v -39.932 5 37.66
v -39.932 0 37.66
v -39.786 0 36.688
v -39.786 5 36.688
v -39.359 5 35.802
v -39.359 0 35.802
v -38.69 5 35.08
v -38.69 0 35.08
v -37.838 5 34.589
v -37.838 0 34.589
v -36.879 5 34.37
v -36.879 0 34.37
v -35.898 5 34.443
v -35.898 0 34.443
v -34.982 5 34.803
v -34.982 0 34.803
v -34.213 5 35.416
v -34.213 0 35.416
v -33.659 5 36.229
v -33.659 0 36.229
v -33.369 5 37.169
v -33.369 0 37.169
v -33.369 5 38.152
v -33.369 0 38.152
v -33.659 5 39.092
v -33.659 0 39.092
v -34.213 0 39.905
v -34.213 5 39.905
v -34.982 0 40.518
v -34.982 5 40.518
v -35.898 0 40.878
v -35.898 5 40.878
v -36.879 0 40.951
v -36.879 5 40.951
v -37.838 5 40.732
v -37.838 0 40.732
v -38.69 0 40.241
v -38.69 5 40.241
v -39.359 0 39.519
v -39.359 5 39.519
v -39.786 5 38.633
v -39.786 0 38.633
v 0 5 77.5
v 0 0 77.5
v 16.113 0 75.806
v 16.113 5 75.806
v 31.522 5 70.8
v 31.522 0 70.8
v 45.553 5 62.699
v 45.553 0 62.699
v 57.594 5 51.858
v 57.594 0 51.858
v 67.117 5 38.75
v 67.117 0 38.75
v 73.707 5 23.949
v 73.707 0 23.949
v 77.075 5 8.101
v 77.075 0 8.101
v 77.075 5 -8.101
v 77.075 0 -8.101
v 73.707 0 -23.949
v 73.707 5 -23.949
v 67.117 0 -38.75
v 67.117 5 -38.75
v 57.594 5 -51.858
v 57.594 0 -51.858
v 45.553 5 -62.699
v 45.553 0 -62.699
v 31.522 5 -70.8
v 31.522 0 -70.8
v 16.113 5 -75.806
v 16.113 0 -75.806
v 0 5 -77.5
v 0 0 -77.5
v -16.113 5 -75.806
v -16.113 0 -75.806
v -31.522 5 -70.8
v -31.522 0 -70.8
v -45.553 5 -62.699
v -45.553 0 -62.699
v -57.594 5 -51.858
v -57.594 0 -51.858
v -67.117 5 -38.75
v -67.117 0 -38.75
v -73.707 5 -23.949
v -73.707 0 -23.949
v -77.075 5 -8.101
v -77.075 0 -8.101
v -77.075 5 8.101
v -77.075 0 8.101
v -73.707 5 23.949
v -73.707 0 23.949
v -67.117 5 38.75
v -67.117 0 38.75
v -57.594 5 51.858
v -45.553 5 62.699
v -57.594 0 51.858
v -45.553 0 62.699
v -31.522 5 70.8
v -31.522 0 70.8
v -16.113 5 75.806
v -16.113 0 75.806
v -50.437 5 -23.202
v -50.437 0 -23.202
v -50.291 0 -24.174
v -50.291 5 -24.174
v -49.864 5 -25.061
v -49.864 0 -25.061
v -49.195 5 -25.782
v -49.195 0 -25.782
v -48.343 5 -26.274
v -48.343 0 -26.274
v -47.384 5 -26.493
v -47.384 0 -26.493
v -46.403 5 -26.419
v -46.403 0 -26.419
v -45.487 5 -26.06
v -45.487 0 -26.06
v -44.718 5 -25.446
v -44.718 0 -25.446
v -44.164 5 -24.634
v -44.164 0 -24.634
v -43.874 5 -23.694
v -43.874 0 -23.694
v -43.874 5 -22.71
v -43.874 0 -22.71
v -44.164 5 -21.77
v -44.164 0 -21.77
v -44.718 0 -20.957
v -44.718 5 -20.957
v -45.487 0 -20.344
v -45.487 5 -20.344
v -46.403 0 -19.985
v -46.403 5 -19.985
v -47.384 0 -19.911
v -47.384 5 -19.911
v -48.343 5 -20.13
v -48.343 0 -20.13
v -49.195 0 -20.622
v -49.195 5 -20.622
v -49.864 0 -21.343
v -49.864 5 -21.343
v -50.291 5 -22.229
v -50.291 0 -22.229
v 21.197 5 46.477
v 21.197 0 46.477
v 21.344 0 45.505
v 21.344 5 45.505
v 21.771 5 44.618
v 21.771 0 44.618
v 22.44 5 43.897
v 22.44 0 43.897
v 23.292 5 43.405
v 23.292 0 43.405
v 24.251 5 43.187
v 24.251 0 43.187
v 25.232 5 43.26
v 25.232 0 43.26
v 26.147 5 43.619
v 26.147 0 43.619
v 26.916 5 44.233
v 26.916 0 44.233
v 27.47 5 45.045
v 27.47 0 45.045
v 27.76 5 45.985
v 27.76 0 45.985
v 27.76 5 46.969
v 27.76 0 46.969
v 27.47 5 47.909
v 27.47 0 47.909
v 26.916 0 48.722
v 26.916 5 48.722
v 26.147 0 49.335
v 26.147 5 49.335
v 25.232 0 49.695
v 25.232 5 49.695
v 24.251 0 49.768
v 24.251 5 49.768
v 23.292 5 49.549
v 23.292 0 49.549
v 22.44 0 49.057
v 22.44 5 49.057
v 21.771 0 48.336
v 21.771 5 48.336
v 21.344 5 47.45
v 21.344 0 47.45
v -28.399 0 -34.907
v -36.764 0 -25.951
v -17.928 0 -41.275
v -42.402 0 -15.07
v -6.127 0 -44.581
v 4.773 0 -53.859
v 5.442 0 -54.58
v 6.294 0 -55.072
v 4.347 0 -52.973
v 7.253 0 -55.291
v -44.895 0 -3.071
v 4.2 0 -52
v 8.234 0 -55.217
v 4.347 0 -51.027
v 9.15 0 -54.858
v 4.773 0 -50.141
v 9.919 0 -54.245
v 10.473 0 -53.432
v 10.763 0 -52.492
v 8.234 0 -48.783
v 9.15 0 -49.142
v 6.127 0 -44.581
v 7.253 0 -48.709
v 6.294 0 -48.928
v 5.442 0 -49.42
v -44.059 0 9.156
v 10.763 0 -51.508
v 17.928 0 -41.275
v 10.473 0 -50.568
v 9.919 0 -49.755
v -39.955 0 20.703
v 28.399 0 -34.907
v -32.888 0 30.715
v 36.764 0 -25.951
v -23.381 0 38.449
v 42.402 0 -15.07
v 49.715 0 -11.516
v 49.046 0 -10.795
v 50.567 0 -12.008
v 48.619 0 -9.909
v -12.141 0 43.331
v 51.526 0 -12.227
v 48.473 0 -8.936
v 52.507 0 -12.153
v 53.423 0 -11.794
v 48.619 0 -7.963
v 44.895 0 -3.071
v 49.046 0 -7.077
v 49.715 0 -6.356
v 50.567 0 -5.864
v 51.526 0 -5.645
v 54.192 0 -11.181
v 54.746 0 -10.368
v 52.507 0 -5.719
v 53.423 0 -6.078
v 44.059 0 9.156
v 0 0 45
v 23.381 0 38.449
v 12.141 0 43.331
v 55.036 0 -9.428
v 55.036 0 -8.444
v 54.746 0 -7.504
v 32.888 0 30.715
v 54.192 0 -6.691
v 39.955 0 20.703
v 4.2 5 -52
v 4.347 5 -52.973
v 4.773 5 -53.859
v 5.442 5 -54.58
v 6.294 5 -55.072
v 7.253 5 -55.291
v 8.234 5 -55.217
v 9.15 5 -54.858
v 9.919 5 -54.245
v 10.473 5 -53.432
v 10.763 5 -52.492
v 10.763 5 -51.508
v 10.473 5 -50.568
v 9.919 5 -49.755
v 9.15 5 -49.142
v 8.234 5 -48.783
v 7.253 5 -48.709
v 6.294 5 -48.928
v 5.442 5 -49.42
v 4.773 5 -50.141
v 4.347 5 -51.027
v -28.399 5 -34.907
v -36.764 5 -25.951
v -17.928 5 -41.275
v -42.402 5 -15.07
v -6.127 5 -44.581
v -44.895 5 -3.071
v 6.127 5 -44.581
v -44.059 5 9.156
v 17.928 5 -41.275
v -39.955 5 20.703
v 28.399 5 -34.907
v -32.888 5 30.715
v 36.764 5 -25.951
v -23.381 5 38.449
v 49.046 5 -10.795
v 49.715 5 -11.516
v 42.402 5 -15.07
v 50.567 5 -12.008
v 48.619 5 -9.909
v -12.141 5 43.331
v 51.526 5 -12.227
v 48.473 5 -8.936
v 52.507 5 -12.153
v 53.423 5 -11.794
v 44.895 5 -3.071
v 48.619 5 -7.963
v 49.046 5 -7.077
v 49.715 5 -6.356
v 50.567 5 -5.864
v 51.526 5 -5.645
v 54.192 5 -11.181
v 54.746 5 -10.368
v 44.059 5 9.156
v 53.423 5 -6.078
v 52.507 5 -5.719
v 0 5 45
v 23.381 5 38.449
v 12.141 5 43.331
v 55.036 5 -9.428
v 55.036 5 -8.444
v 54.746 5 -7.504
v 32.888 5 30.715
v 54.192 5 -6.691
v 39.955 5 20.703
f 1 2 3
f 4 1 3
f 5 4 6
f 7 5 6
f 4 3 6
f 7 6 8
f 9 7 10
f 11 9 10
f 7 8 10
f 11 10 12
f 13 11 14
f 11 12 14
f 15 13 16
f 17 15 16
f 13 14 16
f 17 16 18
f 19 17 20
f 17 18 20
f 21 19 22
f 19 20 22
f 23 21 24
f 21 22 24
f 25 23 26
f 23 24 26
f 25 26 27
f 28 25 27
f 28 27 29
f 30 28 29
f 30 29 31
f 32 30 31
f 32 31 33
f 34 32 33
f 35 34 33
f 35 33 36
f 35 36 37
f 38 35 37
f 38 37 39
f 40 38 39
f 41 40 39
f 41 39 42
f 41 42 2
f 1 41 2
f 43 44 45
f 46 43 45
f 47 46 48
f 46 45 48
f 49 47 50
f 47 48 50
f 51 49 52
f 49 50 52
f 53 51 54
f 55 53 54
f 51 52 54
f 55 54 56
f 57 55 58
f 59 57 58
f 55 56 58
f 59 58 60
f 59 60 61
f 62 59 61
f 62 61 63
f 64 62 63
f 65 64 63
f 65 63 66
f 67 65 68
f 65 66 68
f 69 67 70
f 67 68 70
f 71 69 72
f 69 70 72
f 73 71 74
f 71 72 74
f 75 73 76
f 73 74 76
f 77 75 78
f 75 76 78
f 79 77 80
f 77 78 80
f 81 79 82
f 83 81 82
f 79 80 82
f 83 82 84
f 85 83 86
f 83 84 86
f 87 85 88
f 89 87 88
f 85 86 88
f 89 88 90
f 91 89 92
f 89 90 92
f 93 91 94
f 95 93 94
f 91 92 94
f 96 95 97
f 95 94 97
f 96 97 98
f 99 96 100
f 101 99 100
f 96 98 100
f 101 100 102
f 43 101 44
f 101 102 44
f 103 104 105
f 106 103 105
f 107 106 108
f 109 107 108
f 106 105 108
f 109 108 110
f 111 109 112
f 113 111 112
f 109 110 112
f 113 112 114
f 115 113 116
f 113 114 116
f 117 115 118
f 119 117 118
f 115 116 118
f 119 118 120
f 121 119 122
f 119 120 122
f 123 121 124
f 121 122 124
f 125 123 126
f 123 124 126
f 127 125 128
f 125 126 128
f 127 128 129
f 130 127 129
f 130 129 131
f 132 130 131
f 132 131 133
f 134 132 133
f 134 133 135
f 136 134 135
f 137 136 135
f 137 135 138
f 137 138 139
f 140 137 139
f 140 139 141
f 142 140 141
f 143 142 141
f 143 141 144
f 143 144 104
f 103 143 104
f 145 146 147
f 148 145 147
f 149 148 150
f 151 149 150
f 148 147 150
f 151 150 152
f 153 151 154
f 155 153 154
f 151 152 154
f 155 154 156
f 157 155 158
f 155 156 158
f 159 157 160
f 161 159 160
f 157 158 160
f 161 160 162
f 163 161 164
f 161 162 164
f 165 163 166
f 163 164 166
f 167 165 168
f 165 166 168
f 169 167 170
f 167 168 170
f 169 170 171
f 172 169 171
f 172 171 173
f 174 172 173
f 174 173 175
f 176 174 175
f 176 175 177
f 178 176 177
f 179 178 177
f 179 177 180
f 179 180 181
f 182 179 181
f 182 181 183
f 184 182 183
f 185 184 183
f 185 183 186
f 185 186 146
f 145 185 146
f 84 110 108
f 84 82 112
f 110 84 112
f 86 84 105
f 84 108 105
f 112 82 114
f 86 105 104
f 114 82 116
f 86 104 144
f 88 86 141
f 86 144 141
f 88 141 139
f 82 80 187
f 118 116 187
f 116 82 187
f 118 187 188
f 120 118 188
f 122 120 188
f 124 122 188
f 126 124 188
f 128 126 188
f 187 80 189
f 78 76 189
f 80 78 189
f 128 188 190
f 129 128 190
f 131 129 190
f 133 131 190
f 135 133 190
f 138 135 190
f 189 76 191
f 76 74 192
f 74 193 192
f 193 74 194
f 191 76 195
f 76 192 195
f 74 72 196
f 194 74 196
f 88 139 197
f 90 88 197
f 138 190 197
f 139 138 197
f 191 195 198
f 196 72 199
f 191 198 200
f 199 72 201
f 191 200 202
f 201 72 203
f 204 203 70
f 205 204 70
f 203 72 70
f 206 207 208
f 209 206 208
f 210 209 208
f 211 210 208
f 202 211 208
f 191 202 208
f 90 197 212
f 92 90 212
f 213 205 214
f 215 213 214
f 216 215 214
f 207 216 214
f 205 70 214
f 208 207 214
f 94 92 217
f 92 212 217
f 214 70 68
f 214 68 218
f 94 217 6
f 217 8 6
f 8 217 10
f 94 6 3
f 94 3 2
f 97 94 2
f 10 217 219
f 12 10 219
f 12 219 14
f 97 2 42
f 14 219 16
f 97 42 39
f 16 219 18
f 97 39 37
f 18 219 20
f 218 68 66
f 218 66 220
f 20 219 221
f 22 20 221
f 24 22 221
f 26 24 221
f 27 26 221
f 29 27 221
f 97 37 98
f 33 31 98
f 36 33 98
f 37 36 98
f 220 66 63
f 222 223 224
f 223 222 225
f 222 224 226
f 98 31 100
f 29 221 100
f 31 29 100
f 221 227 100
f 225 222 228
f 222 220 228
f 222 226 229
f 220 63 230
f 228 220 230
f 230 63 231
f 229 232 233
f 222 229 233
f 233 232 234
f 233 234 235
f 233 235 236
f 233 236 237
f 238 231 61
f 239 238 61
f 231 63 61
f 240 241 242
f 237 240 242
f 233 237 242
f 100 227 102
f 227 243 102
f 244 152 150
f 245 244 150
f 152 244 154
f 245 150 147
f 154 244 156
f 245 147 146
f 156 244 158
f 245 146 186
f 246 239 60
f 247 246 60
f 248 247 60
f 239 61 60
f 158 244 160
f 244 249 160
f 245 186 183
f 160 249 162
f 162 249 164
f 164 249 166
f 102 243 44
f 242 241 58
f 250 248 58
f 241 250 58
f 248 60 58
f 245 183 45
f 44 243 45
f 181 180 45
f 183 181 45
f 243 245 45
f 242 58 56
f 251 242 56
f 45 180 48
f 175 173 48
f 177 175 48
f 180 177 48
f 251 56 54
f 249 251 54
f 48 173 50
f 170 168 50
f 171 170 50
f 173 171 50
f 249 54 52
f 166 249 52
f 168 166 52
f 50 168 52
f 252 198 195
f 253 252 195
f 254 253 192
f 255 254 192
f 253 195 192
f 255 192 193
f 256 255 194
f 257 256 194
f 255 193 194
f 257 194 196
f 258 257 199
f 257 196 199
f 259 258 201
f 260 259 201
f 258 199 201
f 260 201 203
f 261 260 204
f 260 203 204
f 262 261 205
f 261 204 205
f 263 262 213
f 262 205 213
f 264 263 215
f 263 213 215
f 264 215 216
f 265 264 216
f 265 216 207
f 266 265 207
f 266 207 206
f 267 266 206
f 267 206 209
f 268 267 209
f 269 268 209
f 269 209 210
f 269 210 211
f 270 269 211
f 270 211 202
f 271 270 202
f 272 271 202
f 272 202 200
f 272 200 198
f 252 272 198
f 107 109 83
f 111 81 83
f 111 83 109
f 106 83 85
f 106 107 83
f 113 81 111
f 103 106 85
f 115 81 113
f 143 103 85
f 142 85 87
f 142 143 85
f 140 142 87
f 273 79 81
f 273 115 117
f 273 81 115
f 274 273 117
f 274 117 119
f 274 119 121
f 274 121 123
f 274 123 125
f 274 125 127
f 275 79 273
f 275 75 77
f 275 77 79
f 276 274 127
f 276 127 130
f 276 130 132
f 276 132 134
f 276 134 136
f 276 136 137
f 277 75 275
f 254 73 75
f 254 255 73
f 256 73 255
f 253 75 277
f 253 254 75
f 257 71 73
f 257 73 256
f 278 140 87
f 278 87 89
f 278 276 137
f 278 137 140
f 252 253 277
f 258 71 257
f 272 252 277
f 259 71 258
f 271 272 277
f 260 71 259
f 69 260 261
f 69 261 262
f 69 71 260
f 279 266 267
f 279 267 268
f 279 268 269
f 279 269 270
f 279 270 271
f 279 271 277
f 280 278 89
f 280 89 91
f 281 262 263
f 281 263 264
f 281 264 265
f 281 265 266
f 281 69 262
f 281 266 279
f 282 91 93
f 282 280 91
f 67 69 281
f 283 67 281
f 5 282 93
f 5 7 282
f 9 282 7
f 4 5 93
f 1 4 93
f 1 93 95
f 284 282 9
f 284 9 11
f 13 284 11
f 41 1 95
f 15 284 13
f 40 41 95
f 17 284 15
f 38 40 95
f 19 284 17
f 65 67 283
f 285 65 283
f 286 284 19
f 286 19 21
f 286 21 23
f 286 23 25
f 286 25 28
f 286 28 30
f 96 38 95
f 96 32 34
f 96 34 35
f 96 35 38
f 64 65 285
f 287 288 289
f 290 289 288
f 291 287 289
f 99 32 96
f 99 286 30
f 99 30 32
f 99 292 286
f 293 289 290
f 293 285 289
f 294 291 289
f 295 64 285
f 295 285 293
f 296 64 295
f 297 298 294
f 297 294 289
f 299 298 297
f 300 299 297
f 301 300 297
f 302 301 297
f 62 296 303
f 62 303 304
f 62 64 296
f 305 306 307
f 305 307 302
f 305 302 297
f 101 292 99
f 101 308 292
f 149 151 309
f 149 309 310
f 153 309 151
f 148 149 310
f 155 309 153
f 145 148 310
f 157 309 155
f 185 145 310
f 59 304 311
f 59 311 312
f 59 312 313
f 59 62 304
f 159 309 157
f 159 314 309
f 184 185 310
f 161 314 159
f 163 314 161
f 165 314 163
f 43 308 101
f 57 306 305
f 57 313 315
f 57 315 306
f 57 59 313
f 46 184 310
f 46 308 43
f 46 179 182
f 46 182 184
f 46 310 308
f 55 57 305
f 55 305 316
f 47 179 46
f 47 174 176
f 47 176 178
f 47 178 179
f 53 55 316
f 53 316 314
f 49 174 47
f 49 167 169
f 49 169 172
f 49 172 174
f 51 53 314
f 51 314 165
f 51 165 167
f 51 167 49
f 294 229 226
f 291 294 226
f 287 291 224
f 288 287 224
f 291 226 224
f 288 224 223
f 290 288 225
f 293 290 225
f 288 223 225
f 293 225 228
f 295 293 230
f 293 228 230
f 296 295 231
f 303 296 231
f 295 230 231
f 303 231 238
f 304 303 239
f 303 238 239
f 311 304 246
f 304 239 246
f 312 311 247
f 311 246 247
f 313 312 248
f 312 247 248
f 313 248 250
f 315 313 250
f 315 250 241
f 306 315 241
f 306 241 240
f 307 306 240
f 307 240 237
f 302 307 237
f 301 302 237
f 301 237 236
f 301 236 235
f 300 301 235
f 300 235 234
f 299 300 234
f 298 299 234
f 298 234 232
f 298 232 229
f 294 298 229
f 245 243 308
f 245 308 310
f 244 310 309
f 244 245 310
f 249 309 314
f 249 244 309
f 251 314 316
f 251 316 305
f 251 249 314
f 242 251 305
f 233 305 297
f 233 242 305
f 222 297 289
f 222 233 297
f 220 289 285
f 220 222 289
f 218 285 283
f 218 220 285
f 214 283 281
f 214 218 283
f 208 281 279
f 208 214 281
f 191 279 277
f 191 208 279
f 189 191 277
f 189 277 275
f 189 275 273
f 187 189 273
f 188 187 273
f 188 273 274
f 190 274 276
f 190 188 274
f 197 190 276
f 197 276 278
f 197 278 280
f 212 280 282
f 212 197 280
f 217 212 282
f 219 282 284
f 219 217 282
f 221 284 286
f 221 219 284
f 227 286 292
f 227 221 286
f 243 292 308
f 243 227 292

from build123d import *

# Parameters (mm, degrees)
SKETCH1_R            = 77.5
SKETCH1_R_2          = 45
BODY_DEPTH           = 5
M6_CLEARANCE_HOLE1_D = 6.6


with BuildPart() as part:
    # Sketch1 → Body (new body)
    with BuildSketch(Plane(origin=(0, 0, 0), x_dir=(1, 0, 0), z_dir=(0, 1, 0))):
        with Locations(Location((0, 0, 0), (0, 0, 270))):
            Circle(SKETCH1_R)
        with Locations(Location((0, 0, 0), (0, 0, 270))):
            Circle(SKETCH1_R_2, mode=Mode.SUBTRACT)
    extrude(amount=BODY_DEPTH)

    # M6 Clearance Hole1 (through all)
    with Locations(Plane(origin=(0, 5, 0), x_dir=(1, 0, 0), z_dir=(0, 1, 0))):
        with Locations((7.5, 52), (51.772566305, 8.935959835), (24.497205661, -46.4772731), (-36.632460577, -37.660494315), (-47.13731139, 23.20180758), (0, 0)):
            Hole(M6_CLEARANCE_HOLE1_D / 2)


solid = part.part
